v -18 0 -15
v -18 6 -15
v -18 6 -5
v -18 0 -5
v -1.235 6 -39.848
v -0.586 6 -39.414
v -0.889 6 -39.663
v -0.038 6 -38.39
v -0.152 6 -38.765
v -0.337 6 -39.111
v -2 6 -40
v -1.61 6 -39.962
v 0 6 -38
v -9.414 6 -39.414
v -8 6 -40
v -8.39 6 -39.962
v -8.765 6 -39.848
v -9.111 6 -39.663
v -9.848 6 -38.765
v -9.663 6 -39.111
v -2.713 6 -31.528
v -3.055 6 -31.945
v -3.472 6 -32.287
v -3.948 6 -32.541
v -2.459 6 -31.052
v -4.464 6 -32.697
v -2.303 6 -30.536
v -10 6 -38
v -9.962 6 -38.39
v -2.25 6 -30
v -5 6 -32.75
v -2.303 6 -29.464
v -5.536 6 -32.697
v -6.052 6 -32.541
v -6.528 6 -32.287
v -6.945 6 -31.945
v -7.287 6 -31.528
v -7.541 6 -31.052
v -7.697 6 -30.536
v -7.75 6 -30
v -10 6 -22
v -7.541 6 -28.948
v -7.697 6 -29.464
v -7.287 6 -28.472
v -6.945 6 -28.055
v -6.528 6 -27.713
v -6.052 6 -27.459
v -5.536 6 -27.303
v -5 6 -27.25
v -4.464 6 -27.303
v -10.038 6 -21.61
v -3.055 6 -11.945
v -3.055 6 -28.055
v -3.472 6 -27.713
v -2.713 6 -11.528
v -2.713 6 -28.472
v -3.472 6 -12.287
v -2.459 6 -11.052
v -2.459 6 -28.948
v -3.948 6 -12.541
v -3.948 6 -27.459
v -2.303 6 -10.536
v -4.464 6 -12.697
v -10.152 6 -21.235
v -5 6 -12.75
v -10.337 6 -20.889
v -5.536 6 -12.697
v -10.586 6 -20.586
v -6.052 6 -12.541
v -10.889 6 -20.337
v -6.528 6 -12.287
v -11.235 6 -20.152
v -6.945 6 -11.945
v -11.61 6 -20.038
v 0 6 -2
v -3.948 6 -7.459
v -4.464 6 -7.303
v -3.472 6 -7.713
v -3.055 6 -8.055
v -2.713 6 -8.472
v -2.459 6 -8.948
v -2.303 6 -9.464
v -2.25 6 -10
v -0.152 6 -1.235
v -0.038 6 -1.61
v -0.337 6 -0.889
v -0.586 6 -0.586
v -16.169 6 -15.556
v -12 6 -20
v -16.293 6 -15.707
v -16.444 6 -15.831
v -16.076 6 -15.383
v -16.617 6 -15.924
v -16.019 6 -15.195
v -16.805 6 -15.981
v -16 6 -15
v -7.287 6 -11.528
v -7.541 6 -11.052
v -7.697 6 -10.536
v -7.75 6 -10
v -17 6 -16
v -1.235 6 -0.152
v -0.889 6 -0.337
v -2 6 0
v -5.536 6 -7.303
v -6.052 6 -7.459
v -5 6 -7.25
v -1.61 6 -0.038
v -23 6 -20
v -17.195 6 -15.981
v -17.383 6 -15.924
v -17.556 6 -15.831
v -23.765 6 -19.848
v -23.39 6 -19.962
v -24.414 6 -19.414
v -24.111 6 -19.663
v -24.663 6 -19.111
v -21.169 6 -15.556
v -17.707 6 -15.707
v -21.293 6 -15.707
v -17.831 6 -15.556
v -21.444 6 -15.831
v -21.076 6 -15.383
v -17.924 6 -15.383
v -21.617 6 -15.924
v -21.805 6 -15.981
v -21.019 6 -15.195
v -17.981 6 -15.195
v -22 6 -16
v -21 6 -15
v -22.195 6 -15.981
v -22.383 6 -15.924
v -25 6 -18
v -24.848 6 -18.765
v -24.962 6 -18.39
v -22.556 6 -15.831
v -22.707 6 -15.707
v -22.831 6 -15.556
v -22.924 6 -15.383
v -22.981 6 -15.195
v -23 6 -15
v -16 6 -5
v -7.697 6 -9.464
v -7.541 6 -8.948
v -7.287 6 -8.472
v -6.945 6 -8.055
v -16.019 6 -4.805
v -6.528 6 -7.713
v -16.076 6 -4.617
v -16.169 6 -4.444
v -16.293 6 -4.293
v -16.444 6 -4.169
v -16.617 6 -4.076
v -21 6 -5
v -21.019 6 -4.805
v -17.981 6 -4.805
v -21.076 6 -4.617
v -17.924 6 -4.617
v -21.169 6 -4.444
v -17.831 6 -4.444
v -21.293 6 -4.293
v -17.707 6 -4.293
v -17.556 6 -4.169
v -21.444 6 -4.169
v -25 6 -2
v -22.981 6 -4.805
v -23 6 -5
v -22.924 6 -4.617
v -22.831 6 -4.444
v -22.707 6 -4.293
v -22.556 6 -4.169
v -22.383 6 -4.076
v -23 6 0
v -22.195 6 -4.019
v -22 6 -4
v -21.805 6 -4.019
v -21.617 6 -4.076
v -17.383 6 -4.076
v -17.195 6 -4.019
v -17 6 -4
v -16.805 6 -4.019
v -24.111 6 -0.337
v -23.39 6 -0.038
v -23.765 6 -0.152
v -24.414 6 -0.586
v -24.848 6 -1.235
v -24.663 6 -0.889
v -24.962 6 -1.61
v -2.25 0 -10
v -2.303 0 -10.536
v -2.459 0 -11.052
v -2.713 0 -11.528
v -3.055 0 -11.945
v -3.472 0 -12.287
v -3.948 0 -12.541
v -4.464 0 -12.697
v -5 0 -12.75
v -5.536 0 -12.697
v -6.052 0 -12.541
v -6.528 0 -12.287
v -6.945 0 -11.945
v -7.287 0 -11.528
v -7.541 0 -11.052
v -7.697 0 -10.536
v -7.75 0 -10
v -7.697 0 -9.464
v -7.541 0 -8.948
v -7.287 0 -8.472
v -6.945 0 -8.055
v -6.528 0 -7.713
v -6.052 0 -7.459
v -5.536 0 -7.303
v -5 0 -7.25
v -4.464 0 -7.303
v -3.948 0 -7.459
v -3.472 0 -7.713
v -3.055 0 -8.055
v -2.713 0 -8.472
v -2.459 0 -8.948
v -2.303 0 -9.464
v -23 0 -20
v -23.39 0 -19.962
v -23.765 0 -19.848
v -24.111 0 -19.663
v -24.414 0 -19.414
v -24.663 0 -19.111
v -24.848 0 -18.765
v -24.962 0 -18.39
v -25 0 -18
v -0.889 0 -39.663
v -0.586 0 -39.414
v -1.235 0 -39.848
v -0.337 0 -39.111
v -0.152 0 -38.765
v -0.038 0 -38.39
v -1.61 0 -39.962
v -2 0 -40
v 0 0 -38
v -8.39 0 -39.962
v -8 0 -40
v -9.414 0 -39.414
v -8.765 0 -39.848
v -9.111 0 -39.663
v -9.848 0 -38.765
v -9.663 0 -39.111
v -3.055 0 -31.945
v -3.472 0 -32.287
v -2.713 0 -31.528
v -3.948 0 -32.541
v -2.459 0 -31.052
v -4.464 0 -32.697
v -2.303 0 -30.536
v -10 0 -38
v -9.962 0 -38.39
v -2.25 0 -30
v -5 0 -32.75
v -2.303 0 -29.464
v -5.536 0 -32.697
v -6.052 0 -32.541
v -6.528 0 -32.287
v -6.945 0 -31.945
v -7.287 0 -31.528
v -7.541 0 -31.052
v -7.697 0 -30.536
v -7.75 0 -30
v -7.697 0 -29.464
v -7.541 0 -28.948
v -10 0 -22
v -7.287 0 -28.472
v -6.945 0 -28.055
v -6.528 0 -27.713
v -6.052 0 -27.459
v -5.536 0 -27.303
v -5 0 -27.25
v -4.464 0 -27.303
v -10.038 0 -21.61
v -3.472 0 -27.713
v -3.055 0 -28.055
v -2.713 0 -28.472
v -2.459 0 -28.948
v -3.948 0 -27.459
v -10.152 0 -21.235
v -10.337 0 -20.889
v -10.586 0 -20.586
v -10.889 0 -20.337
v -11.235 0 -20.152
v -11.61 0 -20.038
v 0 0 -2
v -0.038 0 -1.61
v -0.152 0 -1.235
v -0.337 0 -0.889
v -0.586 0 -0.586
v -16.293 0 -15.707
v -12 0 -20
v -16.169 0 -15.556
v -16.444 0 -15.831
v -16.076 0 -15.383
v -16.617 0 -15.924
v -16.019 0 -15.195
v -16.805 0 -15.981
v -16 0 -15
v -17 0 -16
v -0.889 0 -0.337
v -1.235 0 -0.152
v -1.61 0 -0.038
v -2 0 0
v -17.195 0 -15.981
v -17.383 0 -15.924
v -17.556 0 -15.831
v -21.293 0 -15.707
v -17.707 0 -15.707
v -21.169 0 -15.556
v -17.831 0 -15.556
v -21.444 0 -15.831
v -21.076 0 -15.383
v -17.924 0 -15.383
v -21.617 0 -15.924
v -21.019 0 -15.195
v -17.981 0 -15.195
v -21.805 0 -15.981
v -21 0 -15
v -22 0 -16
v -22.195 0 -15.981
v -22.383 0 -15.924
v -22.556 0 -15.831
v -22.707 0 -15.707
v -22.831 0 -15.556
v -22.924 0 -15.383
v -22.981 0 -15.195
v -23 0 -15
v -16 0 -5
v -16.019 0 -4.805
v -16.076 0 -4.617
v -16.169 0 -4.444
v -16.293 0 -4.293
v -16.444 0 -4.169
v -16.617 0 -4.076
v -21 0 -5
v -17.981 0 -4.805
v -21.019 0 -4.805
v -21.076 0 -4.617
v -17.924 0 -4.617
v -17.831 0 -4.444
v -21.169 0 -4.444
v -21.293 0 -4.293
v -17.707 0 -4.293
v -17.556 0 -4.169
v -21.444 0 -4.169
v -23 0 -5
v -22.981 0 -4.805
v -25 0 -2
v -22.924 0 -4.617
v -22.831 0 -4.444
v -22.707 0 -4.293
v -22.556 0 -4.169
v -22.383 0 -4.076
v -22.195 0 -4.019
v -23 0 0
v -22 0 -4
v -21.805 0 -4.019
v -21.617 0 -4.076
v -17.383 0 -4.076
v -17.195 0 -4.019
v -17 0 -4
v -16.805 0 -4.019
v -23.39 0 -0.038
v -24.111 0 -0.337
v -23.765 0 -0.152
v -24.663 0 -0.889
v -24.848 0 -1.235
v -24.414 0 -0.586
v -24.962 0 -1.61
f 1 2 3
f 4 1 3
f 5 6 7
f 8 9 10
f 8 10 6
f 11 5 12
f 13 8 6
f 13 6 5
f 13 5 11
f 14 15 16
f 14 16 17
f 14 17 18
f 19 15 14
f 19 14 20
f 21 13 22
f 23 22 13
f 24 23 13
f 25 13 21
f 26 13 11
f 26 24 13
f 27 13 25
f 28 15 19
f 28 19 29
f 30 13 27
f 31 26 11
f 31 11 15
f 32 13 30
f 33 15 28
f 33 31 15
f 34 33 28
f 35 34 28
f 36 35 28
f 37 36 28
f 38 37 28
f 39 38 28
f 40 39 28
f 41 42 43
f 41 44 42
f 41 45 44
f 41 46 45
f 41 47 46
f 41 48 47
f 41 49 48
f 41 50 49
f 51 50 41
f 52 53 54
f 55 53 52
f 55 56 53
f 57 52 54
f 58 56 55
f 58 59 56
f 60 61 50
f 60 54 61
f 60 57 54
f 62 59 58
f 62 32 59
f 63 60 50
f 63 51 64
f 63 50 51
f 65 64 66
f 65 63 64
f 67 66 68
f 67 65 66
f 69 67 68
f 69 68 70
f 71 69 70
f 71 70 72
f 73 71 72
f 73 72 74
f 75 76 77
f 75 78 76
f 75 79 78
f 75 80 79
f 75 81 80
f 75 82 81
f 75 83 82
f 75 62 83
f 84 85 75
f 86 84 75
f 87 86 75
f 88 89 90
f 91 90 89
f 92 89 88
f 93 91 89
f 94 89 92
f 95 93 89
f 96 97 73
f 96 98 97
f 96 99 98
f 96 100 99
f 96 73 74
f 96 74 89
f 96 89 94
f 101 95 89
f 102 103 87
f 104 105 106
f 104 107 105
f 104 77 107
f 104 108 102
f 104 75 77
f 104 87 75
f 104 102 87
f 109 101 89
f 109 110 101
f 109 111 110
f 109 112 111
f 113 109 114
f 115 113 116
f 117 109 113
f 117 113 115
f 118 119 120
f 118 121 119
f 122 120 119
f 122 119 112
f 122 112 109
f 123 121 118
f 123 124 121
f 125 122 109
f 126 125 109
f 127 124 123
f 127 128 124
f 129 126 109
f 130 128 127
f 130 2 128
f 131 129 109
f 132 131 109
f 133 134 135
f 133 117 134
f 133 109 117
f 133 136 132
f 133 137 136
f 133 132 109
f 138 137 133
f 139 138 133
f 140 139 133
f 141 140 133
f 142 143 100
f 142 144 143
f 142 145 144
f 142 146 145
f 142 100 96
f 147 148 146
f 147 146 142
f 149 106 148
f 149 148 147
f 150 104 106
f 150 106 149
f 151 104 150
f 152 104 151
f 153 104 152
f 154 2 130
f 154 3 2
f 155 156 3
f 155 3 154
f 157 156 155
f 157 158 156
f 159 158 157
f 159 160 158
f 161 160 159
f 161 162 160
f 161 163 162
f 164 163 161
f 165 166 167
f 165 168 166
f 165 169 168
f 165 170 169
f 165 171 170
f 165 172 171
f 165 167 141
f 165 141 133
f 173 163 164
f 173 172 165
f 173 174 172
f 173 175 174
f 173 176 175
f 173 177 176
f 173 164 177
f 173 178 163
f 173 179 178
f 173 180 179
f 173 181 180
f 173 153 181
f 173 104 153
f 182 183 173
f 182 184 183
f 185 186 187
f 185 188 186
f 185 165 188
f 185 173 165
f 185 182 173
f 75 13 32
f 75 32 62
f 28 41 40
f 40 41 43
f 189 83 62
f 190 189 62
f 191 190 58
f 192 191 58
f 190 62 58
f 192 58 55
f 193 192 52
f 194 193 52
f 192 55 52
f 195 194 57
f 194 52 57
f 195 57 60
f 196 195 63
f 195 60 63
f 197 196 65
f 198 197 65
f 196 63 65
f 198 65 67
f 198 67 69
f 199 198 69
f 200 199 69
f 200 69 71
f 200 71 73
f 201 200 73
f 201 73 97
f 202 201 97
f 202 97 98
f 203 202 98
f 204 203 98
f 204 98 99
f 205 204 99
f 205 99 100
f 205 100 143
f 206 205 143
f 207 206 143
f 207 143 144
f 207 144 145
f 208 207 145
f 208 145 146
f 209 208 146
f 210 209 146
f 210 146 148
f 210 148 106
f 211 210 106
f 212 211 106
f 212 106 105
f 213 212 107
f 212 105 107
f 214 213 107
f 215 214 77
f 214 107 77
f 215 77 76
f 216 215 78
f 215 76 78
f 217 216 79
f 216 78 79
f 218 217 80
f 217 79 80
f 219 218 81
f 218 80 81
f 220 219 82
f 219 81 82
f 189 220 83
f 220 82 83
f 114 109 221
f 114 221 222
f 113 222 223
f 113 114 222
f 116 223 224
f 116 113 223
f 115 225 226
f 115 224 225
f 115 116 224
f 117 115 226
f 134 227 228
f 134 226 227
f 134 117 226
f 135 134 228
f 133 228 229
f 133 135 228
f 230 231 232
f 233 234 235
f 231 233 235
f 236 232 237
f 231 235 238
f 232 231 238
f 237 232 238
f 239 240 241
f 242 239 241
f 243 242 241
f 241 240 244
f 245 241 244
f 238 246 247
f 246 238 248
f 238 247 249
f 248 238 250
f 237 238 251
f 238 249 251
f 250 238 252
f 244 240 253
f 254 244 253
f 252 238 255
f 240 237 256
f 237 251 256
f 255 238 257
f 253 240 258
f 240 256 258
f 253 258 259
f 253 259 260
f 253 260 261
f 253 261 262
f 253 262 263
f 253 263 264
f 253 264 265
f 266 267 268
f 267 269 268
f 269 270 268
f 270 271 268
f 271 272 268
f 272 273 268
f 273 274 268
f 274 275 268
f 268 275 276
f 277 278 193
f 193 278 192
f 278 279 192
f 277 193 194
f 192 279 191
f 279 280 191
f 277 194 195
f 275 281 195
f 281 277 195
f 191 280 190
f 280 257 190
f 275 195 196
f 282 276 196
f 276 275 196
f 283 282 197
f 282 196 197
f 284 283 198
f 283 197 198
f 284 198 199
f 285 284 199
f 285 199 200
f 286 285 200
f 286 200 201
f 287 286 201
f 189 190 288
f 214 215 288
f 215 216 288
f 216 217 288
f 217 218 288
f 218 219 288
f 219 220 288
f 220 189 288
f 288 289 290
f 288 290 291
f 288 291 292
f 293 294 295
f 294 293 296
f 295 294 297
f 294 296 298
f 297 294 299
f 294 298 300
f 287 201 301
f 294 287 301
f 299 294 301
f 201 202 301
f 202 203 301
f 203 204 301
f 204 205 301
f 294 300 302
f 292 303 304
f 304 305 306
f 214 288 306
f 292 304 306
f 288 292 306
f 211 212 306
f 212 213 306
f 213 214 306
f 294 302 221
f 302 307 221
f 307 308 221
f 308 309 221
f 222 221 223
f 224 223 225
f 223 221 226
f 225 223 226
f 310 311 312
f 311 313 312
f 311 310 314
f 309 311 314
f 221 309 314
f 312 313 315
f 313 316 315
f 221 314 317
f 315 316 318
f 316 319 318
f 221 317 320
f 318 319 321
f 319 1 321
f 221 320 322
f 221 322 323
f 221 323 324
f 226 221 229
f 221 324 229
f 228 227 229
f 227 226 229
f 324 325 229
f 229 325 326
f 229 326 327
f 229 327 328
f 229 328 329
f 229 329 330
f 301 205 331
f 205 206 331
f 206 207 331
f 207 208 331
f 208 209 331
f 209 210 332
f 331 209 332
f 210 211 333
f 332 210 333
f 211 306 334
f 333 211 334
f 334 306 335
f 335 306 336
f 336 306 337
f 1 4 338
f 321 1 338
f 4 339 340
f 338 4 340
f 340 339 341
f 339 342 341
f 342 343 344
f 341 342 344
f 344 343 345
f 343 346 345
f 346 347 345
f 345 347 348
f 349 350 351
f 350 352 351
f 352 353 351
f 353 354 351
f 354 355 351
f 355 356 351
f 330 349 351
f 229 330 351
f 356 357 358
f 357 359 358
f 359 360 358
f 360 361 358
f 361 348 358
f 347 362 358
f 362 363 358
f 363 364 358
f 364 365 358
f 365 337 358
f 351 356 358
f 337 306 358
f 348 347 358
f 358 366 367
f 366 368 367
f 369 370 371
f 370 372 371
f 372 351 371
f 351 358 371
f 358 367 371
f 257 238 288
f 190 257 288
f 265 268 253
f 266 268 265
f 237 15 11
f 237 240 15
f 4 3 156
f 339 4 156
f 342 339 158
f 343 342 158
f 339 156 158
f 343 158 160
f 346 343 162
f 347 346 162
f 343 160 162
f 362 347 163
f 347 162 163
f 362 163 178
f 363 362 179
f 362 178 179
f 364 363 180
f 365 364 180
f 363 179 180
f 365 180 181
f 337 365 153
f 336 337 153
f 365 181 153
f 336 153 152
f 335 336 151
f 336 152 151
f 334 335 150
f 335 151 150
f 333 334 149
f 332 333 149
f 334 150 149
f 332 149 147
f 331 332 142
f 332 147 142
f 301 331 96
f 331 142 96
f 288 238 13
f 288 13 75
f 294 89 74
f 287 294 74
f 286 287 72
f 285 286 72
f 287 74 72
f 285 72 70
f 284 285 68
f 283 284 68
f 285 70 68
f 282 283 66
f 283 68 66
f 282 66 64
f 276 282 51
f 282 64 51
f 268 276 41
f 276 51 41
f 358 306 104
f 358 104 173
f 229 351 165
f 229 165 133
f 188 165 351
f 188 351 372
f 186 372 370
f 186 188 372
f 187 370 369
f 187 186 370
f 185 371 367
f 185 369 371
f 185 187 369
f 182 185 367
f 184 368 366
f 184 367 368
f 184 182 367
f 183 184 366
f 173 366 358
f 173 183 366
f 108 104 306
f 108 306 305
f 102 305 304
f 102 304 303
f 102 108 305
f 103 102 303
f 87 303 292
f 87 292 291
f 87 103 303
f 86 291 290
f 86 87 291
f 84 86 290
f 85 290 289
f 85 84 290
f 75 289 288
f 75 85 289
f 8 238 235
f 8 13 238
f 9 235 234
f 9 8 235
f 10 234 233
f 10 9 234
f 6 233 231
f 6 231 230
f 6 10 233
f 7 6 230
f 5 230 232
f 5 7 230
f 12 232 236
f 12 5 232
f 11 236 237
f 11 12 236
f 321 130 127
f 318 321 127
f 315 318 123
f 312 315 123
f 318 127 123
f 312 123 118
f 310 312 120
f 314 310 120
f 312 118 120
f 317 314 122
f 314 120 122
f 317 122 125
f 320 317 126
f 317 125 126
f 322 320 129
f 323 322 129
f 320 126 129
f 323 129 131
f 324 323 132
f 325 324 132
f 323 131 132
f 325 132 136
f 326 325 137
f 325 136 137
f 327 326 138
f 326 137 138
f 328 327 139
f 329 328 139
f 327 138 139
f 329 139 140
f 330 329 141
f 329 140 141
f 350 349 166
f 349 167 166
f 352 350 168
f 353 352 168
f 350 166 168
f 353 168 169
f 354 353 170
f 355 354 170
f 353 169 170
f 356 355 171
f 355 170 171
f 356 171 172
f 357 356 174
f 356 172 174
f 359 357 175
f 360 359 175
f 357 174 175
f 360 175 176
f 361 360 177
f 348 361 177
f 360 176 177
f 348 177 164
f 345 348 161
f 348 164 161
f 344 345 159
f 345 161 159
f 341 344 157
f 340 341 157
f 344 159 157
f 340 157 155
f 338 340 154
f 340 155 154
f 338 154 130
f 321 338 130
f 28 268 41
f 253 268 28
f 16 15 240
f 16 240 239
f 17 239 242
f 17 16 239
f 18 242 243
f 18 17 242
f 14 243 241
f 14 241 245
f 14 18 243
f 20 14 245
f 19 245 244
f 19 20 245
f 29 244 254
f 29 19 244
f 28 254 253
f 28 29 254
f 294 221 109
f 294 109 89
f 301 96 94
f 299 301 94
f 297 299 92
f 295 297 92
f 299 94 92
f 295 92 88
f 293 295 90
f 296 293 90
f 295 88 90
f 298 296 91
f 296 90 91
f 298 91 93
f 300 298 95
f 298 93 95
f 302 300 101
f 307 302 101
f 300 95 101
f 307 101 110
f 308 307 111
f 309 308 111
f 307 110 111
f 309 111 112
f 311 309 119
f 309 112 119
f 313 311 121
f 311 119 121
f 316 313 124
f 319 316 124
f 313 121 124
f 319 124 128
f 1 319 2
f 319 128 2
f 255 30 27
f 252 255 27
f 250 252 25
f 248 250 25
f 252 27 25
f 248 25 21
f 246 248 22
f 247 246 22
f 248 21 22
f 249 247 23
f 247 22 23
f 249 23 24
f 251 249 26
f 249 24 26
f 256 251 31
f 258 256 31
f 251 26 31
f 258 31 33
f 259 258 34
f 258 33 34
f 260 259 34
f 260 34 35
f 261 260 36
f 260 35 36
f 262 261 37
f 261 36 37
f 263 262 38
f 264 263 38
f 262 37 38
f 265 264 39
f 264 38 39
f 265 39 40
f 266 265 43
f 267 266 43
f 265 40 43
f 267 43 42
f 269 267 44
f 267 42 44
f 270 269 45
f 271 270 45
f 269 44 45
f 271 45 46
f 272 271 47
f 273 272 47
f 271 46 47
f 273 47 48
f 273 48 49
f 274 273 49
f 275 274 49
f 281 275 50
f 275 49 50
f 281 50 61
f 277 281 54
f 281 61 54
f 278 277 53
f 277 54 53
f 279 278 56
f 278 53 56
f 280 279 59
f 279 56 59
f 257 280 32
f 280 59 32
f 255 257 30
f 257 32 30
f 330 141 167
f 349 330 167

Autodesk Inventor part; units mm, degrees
ref_plane "YZ Plane" through (0, 0, 0) normal (1, 0, 0) x (0, 1, 0)
ref_plane "XZ Plane" through (0, 0, 0) normal (0, 1, 0) x (-1, 0, 0)
ref_plane "XY Plane" through (0, 0, 0) normal (0, 0, 1) x (1, 0, 0)
sketch "Sketch1" plane through (0, 0, 0) normal (0, 1, 0) x (-1, 0, 0)
  line L0 (0, 0) -> (10, 0)
  line L1 (10, 0) -> (10, -40)
  line L2 (10, -40) -> (0, -40)
  line L3 (0, -40) -> (0, 0)
  line L4 (10, 0) -> (25, 0)
  line L5 (25, 0) -> (25, -20)
  line L6 (25, -20) -> (10, -20)
  line L7 (10, -20) -> (10, 0)
  dimension "d0" = 10
  dimension "d1" = 40
  dimension "d2" = 15
  dimension "d3" = 20
extrude "Extrusion1" add sketch "Sketch1" along normal blind 6
sketch "Sketch2" plane through (0, 6, 0) normal (0, 1, 0) x (1, 0, 0)
  circle A0 centre (-5, 10) radius 2.75
  line L0 (0, 0) -> (0, 40) projected
  line L1 (-25, 0) -> (0, 0) projected
  circle A1 centre (-5, 30) radius 2.75
  line L2 (-25, 20) -> (-25, 0) projected
  line L3 (-25, 10) -> (-22, 10)
  line L4 (-22, 10) -> (-17, 10)
  line L5 (-22, 5) -> (-22, 15) construction
  line L6 (-21, 5) -> (-21, 15)
  line L7 (-23, 15) -> (-23, 5)
  arc A2 (-23, 5) -> (-21, 5) centre (-22, 5) ccw
  arc A3 (-21, 15) -> (-23, 15) centre (-22, 15) ccw
  line L8 (-17, 5) -> (-17, 15) construction
  line L9 (-16, 5) -> (-16, 15)
  line L10 (-18, 15) -> (-18, 5)
  arc A4 (-18, 5) -> (-16, 5) centre (-17, 5) ccw
  arc A5 (-16, 15) -> (-18, 15) centre (-17, 15) ccw
  line L11 (-17, 10) -> (-7, 10) construction
  dimension "d6" = 5.5
  dimension "d7" = 5
  dimension "d8" = 10
  dimension "d9" = 5.5
  dimension "d10" = 5
  dimension "d11" = 20
  dimension "d12" = 3
  dimension "d13" = 5
  dimension "d14" = 5
  dimension "d15" = 2
  dimension "d16" = 5
  dimension "d17" = 90
  dimension "d18" = 2
extrude "Extrusion2" cut sketch "Sketch2" against normal up to next
fillet "Fillet1" radius 2 6 edges at (0, 3, 0) (-25, 3, 0) (0, 3, -40) (-10, 3, -40) (-10, 3, -20) (-25, 3, -20)
properties part number "Small_Belt_Clamp"
